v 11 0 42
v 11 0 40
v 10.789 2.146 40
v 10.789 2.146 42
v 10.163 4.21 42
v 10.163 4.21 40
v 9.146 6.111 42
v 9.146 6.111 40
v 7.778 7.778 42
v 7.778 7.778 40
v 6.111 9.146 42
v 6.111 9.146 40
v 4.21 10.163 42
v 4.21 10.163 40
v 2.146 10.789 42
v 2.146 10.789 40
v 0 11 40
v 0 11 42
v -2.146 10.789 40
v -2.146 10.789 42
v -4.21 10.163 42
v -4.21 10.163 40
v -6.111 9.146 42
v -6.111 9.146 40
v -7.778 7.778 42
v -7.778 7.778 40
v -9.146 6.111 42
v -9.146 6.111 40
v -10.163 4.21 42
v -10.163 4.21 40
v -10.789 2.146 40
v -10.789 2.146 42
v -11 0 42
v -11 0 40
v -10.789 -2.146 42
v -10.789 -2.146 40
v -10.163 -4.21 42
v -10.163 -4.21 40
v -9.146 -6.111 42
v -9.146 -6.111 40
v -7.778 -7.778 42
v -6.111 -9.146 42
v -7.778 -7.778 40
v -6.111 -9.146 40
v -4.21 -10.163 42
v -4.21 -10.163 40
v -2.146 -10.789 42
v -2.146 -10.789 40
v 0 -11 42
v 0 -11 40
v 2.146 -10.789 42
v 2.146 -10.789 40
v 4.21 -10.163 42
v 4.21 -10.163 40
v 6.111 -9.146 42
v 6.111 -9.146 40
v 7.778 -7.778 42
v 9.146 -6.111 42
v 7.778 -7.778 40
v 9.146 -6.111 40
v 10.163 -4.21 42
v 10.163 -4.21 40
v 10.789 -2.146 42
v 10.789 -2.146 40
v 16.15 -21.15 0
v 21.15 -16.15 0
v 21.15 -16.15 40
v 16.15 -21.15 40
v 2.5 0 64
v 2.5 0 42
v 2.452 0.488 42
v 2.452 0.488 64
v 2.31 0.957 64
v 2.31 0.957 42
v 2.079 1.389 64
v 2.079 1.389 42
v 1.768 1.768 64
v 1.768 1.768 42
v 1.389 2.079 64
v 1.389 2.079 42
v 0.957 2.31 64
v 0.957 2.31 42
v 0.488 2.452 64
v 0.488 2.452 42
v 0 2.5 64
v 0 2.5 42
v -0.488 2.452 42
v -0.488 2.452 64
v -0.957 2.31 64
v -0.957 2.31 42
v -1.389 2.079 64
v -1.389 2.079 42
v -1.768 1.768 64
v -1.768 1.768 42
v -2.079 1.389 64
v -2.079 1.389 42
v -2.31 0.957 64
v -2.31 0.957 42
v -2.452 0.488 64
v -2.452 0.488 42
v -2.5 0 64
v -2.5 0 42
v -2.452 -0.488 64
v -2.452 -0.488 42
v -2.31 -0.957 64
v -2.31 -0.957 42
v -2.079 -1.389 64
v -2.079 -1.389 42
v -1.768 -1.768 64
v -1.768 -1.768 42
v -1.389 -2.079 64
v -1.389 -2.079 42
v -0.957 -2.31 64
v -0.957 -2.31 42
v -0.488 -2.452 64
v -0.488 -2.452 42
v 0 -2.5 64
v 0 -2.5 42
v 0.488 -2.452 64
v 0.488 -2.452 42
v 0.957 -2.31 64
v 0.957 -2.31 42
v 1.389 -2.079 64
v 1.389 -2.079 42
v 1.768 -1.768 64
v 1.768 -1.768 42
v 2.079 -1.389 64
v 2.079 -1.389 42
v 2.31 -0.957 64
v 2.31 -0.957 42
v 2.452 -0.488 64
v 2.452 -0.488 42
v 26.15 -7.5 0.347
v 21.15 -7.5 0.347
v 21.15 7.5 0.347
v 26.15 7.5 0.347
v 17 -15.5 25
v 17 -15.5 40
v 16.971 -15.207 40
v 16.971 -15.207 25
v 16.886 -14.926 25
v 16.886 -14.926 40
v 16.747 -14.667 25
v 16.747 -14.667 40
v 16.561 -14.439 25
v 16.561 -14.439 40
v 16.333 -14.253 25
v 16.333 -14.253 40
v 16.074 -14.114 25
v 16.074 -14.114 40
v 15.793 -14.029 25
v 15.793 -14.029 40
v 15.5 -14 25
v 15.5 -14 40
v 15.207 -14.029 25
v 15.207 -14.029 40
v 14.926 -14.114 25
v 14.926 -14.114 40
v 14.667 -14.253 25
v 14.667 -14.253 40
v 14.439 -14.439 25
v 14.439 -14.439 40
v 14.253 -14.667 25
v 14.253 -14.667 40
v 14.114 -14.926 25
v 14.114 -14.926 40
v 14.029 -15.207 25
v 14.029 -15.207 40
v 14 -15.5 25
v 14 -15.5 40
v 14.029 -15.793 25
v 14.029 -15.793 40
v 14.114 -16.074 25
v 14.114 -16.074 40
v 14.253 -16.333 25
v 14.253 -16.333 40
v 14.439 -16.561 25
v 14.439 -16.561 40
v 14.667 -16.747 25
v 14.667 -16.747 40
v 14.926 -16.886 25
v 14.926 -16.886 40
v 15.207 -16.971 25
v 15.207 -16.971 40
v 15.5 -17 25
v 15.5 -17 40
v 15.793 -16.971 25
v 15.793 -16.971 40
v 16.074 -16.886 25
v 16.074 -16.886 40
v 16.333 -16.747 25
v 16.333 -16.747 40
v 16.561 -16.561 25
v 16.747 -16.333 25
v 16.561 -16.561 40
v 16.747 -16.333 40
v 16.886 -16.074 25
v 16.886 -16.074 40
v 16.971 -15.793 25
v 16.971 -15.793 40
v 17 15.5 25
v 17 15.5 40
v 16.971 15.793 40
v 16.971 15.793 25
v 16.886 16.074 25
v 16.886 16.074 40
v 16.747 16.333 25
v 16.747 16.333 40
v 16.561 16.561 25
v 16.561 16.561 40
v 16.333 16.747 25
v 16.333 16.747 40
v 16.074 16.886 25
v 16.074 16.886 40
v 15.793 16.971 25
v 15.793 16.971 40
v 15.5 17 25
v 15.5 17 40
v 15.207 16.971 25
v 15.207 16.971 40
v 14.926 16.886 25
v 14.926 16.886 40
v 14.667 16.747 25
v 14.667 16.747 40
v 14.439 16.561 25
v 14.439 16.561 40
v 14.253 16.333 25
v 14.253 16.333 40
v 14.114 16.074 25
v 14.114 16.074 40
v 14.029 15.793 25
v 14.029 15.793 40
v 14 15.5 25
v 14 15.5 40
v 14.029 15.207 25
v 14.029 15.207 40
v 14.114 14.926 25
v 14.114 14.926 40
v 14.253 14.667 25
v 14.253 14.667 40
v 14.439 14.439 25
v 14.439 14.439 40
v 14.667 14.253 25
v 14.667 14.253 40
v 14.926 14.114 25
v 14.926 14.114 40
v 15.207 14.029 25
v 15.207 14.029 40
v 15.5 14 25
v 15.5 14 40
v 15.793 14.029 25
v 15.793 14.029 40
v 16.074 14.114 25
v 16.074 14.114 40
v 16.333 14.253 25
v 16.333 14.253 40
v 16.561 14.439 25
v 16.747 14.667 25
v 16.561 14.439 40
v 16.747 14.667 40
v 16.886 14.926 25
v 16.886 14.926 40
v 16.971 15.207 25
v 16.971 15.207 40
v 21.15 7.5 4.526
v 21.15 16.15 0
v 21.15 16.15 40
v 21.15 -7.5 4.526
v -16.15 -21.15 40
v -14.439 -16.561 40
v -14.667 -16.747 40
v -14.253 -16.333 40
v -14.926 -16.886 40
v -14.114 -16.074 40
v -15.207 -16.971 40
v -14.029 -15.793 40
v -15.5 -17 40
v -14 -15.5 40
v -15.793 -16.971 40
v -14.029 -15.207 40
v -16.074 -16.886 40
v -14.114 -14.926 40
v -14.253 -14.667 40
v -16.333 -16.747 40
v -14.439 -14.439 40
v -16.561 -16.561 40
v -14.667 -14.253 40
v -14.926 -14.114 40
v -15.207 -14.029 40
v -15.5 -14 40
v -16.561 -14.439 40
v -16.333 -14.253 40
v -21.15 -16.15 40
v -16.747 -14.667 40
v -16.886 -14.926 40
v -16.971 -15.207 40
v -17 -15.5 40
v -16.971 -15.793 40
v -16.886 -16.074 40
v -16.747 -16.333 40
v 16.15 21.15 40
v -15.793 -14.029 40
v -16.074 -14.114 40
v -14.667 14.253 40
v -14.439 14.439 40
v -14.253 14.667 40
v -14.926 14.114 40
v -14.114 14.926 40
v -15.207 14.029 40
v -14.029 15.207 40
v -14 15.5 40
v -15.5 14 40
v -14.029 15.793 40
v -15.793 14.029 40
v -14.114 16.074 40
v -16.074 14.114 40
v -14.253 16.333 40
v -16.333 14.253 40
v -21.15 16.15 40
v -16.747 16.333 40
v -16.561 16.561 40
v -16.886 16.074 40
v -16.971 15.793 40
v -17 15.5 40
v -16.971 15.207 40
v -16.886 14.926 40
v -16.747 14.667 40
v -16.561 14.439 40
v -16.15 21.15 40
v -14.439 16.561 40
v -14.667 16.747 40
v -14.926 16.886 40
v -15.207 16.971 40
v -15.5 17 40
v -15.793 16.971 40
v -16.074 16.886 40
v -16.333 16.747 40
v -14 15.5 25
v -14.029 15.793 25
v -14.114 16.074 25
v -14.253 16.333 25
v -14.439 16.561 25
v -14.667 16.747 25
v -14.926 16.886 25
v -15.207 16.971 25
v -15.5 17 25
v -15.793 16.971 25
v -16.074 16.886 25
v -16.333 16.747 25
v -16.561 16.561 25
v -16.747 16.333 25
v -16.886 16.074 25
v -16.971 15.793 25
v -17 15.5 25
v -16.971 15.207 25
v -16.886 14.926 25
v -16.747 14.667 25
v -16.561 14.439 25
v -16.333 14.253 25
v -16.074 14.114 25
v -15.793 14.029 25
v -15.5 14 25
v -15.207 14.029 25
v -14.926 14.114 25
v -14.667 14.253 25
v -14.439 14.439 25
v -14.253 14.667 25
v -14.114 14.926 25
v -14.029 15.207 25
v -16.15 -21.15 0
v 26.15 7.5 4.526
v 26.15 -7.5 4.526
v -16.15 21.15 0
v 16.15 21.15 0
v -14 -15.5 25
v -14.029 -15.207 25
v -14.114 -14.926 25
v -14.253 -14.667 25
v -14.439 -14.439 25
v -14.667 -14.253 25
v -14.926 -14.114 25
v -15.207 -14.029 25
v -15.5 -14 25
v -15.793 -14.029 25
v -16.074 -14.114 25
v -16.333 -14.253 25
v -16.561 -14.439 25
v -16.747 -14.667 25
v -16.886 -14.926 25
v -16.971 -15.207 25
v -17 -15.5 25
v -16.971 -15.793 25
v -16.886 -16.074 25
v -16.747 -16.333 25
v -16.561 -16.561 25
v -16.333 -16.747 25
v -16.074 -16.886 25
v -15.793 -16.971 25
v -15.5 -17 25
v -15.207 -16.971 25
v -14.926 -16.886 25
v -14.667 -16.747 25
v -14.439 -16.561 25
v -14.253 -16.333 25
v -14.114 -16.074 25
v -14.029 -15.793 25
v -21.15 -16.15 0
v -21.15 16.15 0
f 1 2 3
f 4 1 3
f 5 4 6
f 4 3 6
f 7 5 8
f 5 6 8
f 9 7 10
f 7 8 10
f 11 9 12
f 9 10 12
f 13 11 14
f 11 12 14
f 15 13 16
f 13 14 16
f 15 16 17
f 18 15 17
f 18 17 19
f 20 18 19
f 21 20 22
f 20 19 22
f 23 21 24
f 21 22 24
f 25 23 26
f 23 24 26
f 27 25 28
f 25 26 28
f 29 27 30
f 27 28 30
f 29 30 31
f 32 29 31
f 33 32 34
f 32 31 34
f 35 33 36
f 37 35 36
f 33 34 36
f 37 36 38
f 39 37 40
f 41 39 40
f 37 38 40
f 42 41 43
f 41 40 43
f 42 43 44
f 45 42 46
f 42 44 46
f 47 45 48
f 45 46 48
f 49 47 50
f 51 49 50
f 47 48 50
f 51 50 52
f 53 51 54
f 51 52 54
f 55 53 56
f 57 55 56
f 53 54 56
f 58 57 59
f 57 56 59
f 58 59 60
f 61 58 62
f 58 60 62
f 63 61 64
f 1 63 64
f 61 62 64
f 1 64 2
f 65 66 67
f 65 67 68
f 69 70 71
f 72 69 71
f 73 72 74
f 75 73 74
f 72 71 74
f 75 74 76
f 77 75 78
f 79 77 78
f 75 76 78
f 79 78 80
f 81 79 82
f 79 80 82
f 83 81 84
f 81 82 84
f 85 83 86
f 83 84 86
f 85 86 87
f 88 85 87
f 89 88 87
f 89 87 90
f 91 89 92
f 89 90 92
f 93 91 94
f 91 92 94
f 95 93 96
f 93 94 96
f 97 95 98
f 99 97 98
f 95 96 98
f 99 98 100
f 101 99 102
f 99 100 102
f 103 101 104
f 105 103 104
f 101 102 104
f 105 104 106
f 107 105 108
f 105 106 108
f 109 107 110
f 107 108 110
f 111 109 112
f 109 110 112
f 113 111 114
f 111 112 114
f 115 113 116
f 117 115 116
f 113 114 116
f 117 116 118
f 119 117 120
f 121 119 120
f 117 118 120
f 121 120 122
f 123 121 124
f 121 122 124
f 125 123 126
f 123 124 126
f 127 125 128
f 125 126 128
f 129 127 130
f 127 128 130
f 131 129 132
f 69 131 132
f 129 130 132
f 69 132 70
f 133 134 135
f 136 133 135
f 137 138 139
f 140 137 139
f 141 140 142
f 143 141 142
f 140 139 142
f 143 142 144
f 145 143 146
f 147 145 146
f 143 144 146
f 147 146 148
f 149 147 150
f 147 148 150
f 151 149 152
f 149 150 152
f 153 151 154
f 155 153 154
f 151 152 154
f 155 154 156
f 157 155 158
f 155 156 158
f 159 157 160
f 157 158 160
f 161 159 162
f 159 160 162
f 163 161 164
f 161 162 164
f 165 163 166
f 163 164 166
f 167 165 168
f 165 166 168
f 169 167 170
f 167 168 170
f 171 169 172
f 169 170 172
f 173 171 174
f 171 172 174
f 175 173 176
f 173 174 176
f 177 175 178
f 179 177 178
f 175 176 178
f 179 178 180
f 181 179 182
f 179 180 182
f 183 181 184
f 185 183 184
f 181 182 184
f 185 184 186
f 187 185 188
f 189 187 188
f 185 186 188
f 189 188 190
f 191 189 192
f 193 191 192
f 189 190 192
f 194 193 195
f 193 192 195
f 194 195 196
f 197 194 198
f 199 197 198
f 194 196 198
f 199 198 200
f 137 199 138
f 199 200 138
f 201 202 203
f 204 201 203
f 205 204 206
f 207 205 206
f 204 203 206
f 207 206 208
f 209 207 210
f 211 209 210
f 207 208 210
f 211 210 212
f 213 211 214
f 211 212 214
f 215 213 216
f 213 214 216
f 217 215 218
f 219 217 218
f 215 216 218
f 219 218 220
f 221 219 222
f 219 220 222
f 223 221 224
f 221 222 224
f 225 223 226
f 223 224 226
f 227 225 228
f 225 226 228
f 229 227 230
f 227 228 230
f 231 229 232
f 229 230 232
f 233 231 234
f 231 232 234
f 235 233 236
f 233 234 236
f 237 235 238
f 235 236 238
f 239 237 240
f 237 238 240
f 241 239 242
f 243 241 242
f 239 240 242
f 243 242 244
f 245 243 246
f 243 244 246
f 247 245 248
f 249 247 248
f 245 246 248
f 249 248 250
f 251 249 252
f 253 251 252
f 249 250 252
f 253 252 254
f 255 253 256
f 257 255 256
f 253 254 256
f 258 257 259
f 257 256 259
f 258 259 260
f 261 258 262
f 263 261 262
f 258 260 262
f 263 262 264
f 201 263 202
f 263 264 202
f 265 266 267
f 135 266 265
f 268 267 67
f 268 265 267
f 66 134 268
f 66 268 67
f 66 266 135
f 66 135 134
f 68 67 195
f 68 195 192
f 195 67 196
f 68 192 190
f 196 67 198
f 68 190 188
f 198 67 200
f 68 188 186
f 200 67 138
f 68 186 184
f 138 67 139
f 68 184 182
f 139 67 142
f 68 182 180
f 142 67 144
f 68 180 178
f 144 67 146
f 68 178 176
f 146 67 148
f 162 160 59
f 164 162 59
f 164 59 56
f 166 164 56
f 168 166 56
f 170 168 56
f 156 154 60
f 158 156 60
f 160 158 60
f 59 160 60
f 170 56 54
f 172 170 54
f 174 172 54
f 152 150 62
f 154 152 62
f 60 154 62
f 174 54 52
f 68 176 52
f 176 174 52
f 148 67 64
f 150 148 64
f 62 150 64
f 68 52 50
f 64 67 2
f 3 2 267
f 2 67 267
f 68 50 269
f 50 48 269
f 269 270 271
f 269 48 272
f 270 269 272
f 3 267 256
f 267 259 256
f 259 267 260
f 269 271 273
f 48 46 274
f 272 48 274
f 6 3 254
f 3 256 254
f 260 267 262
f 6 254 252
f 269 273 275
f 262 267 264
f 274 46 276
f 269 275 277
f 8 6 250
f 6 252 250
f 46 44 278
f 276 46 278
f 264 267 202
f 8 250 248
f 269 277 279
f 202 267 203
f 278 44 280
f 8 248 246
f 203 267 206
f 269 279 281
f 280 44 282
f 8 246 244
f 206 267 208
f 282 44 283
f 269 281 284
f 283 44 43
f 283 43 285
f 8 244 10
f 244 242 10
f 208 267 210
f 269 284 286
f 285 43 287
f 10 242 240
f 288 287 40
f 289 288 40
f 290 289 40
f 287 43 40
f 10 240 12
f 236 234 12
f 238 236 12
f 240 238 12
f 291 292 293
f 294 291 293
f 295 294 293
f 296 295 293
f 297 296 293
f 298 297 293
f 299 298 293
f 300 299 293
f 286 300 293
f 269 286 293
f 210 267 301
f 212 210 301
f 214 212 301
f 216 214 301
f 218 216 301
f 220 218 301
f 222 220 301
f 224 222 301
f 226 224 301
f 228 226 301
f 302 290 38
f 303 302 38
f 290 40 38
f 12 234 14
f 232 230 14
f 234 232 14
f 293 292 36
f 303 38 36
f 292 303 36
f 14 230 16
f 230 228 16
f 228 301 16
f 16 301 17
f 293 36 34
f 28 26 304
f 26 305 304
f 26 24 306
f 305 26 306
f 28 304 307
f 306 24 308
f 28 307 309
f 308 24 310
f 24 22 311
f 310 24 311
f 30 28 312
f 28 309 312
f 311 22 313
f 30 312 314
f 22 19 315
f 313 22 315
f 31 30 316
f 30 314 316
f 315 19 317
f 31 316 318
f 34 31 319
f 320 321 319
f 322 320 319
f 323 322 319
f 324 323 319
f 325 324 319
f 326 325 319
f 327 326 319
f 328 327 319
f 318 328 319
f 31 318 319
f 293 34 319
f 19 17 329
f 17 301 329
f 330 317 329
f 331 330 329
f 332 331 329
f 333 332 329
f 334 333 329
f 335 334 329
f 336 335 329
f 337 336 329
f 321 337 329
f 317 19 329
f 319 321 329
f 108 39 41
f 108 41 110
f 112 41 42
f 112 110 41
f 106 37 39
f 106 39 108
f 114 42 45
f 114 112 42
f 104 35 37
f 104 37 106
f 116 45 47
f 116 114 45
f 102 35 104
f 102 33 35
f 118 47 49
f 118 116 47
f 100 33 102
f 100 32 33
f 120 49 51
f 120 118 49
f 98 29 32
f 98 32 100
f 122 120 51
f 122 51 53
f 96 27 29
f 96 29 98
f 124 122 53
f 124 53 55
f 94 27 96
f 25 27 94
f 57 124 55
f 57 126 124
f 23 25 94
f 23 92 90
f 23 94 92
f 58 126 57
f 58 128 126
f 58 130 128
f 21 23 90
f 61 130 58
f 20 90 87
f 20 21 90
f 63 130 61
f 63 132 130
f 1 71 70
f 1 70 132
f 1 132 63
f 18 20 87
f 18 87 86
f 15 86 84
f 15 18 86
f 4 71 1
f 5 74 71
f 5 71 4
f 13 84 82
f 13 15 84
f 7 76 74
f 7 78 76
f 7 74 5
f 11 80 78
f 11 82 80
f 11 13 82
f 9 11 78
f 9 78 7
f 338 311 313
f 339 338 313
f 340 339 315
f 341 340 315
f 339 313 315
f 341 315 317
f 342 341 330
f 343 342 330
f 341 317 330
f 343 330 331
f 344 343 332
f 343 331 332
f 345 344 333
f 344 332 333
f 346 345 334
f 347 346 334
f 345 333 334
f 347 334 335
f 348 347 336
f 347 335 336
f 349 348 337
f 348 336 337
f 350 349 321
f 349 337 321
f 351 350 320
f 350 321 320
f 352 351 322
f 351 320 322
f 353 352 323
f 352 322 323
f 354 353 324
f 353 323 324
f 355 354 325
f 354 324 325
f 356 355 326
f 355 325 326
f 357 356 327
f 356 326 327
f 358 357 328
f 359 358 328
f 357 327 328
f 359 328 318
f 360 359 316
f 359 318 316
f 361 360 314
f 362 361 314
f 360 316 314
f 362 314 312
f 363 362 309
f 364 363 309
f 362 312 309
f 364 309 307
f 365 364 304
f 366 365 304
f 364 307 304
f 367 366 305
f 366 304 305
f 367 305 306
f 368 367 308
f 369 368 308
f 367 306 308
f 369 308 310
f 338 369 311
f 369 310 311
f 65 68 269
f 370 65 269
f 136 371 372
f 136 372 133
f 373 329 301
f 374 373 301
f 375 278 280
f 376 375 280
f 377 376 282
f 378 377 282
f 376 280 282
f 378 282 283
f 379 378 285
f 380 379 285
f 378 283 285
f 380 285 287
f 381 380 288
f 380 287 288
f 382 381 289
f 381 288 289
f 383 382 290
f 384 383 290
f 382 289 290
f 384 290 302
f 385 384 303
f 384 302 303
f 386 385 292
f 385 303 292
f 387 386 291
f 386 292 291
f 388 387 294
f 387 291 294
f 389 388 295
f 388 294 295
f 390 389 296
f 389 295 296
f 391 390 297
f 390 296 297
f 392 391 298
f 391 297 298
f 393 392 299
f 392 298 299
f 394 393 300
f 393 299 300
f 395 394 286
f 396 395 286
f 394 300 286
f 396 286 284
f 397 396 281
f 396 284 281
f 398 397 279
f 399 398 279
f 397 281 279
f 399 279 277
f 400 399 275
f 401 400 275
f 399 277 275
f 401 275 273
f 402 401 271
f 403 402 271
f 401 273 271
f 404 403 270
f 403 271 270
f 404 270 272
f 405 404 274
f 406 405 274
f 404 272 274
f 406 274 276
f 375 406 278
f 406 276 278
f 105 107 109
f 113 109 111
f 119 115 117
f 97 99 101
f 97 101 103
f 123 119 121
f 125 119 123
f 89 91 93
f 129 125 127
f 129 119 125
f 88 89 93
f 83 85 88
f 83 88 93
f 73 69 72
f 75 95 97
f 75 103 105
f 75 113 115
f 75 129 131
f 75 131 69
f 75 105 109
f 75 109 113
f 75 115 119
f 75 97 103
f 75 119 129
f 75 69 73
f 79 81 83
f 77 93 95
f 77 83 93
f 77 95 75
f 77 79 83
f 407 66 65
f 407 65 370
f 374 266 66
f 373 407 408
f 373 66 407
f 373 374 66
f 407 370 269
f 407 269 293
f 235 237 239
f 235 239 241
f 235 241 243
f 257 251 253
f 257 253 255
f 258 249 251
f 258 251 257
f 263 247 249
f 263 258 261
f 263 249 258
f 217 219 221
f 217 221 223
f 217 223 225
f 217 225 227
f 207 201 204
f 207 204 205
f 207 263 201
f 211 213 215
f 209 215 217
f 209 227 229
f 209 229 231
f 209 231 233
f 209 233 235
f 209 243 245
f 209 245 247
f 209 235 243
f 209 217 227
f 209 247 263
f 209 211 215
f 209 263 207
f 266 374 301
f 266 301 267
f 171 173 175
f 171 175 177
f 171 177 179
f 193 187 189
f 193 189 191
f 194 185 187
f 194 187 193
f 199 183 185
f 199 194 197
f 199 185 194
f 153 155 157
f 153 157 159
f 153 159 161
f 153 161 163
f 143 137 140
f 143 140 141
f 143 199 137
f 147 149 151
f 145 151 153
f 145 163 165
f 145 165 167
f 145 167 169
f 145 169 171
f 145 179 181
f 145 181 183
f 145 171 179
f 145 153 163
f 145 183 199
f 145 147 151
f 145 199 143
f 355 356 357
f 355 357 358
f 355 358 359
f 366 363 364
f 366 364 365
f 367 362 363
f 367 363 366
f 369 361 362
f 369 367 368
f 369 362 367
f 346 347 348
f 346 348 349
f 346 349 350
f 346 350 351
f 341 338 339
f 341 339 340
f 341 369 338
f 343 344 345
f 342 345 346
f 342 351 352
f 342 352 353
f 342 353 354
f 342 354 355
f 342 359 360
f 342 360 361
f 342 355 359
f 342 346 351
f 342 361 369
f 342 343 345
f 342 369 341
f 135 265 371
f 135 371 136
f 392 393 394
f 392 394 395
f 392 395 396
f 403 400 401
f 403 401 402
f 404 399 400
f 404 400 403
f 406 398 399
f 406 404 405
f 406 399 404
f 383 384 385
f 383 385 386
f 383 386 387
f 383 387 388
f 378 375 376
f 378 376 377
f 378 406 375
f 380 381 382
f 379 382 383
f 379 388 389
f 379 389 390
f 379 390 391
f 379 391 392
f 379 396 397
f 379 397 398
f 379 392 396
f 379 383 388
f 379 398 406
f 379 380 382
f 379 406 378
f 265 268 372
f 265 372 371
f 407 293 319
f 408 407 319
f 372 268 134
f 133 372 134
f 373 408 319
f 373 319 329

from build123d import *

# Parameters (mm, degrees)
RESSALTO_EXTRUS_O1_DEPTH = 40
ESBO_O2_R                = 11
RESSALTO_EXTRUS_O2_DEPTH = 2
ESBO_O3_R                = 2.5
RESSALTO_EXTRUS_O3_DEPTH = 22
ESBO_O4_R                = 1.5
CORTE_EXTRUS_O1_DEPTH    = 15
ESBO_O5_W                = 4.17956517
ESBO_O5_H                = 15
RESSALTO_EXTRUS_O4_DEPTH = 5


with BuildPart() as part:
    # Esboço1 → Ressalto-extrusão1 (new body)
    with BuildSketch(Plane.XY):
        Polygon((-21.15, 16.15), (-16.15, 21.15), (16.15, 21.15), (21.15, 16.15), (21.15, -16.15), (16.15, -21.15), (-16.15, -21.15), (-21.15, -16.15), align=None)
    extrude(amount=RESSALTO_EXTRUS_O1_DEPTH)

    # Esboço2 → Ressalto-extrusão2 (add)
    with BuildSketch(Plane.XY.offset(40)):
        Circle(ESBO_O2_R)
    extrude(amount=RESSALTO_EXTRUS_O2_DEPTH)

    # Esboço3 → Ressalto-extrusão3 (add)
    with BuildSketch(Plane.XY.offset(42)):
        Circle(ESBO_O3_R)
    extrude(amount=RESSALTO_EXTRUS_O3_DEPTH)

    # Esboço4 → Corte-extrusão1 (cut)
    with BuildSketch(Plane.XY.offset(40)):
        with Locations((15.5, -15.5)):
            Circle(ESBO_O4_R)
        with Locations((15.5, 15.5)):
            Circle(ESBO_O4_R)
        with Locations((-15.5, -15.5)):
            Circle(ESBO_O4_R)
        with Locations((-15.5, 15.5)):
            Circle(ESBO_O4_R)
    extrude(amount=-CORTE_EXTRUS_O1_DEPTH, mode=Mode.SUBTRACT)

    # Esboço5 → Ressalto-extrusão4 (add)
    with BuildSketch(Plane(origin=(21.15, 0, 0), x_dir=(0, 0, -1), z_dir=(1, 0, 0))):
        with Locations((-2.436524566, 0)):
            Rectangle(ESBO_O5_W, ESBO_O5_H)
    extrude(amount=RESSALTO_EXTRUS_O4_DEPTH)


solid = part.part
